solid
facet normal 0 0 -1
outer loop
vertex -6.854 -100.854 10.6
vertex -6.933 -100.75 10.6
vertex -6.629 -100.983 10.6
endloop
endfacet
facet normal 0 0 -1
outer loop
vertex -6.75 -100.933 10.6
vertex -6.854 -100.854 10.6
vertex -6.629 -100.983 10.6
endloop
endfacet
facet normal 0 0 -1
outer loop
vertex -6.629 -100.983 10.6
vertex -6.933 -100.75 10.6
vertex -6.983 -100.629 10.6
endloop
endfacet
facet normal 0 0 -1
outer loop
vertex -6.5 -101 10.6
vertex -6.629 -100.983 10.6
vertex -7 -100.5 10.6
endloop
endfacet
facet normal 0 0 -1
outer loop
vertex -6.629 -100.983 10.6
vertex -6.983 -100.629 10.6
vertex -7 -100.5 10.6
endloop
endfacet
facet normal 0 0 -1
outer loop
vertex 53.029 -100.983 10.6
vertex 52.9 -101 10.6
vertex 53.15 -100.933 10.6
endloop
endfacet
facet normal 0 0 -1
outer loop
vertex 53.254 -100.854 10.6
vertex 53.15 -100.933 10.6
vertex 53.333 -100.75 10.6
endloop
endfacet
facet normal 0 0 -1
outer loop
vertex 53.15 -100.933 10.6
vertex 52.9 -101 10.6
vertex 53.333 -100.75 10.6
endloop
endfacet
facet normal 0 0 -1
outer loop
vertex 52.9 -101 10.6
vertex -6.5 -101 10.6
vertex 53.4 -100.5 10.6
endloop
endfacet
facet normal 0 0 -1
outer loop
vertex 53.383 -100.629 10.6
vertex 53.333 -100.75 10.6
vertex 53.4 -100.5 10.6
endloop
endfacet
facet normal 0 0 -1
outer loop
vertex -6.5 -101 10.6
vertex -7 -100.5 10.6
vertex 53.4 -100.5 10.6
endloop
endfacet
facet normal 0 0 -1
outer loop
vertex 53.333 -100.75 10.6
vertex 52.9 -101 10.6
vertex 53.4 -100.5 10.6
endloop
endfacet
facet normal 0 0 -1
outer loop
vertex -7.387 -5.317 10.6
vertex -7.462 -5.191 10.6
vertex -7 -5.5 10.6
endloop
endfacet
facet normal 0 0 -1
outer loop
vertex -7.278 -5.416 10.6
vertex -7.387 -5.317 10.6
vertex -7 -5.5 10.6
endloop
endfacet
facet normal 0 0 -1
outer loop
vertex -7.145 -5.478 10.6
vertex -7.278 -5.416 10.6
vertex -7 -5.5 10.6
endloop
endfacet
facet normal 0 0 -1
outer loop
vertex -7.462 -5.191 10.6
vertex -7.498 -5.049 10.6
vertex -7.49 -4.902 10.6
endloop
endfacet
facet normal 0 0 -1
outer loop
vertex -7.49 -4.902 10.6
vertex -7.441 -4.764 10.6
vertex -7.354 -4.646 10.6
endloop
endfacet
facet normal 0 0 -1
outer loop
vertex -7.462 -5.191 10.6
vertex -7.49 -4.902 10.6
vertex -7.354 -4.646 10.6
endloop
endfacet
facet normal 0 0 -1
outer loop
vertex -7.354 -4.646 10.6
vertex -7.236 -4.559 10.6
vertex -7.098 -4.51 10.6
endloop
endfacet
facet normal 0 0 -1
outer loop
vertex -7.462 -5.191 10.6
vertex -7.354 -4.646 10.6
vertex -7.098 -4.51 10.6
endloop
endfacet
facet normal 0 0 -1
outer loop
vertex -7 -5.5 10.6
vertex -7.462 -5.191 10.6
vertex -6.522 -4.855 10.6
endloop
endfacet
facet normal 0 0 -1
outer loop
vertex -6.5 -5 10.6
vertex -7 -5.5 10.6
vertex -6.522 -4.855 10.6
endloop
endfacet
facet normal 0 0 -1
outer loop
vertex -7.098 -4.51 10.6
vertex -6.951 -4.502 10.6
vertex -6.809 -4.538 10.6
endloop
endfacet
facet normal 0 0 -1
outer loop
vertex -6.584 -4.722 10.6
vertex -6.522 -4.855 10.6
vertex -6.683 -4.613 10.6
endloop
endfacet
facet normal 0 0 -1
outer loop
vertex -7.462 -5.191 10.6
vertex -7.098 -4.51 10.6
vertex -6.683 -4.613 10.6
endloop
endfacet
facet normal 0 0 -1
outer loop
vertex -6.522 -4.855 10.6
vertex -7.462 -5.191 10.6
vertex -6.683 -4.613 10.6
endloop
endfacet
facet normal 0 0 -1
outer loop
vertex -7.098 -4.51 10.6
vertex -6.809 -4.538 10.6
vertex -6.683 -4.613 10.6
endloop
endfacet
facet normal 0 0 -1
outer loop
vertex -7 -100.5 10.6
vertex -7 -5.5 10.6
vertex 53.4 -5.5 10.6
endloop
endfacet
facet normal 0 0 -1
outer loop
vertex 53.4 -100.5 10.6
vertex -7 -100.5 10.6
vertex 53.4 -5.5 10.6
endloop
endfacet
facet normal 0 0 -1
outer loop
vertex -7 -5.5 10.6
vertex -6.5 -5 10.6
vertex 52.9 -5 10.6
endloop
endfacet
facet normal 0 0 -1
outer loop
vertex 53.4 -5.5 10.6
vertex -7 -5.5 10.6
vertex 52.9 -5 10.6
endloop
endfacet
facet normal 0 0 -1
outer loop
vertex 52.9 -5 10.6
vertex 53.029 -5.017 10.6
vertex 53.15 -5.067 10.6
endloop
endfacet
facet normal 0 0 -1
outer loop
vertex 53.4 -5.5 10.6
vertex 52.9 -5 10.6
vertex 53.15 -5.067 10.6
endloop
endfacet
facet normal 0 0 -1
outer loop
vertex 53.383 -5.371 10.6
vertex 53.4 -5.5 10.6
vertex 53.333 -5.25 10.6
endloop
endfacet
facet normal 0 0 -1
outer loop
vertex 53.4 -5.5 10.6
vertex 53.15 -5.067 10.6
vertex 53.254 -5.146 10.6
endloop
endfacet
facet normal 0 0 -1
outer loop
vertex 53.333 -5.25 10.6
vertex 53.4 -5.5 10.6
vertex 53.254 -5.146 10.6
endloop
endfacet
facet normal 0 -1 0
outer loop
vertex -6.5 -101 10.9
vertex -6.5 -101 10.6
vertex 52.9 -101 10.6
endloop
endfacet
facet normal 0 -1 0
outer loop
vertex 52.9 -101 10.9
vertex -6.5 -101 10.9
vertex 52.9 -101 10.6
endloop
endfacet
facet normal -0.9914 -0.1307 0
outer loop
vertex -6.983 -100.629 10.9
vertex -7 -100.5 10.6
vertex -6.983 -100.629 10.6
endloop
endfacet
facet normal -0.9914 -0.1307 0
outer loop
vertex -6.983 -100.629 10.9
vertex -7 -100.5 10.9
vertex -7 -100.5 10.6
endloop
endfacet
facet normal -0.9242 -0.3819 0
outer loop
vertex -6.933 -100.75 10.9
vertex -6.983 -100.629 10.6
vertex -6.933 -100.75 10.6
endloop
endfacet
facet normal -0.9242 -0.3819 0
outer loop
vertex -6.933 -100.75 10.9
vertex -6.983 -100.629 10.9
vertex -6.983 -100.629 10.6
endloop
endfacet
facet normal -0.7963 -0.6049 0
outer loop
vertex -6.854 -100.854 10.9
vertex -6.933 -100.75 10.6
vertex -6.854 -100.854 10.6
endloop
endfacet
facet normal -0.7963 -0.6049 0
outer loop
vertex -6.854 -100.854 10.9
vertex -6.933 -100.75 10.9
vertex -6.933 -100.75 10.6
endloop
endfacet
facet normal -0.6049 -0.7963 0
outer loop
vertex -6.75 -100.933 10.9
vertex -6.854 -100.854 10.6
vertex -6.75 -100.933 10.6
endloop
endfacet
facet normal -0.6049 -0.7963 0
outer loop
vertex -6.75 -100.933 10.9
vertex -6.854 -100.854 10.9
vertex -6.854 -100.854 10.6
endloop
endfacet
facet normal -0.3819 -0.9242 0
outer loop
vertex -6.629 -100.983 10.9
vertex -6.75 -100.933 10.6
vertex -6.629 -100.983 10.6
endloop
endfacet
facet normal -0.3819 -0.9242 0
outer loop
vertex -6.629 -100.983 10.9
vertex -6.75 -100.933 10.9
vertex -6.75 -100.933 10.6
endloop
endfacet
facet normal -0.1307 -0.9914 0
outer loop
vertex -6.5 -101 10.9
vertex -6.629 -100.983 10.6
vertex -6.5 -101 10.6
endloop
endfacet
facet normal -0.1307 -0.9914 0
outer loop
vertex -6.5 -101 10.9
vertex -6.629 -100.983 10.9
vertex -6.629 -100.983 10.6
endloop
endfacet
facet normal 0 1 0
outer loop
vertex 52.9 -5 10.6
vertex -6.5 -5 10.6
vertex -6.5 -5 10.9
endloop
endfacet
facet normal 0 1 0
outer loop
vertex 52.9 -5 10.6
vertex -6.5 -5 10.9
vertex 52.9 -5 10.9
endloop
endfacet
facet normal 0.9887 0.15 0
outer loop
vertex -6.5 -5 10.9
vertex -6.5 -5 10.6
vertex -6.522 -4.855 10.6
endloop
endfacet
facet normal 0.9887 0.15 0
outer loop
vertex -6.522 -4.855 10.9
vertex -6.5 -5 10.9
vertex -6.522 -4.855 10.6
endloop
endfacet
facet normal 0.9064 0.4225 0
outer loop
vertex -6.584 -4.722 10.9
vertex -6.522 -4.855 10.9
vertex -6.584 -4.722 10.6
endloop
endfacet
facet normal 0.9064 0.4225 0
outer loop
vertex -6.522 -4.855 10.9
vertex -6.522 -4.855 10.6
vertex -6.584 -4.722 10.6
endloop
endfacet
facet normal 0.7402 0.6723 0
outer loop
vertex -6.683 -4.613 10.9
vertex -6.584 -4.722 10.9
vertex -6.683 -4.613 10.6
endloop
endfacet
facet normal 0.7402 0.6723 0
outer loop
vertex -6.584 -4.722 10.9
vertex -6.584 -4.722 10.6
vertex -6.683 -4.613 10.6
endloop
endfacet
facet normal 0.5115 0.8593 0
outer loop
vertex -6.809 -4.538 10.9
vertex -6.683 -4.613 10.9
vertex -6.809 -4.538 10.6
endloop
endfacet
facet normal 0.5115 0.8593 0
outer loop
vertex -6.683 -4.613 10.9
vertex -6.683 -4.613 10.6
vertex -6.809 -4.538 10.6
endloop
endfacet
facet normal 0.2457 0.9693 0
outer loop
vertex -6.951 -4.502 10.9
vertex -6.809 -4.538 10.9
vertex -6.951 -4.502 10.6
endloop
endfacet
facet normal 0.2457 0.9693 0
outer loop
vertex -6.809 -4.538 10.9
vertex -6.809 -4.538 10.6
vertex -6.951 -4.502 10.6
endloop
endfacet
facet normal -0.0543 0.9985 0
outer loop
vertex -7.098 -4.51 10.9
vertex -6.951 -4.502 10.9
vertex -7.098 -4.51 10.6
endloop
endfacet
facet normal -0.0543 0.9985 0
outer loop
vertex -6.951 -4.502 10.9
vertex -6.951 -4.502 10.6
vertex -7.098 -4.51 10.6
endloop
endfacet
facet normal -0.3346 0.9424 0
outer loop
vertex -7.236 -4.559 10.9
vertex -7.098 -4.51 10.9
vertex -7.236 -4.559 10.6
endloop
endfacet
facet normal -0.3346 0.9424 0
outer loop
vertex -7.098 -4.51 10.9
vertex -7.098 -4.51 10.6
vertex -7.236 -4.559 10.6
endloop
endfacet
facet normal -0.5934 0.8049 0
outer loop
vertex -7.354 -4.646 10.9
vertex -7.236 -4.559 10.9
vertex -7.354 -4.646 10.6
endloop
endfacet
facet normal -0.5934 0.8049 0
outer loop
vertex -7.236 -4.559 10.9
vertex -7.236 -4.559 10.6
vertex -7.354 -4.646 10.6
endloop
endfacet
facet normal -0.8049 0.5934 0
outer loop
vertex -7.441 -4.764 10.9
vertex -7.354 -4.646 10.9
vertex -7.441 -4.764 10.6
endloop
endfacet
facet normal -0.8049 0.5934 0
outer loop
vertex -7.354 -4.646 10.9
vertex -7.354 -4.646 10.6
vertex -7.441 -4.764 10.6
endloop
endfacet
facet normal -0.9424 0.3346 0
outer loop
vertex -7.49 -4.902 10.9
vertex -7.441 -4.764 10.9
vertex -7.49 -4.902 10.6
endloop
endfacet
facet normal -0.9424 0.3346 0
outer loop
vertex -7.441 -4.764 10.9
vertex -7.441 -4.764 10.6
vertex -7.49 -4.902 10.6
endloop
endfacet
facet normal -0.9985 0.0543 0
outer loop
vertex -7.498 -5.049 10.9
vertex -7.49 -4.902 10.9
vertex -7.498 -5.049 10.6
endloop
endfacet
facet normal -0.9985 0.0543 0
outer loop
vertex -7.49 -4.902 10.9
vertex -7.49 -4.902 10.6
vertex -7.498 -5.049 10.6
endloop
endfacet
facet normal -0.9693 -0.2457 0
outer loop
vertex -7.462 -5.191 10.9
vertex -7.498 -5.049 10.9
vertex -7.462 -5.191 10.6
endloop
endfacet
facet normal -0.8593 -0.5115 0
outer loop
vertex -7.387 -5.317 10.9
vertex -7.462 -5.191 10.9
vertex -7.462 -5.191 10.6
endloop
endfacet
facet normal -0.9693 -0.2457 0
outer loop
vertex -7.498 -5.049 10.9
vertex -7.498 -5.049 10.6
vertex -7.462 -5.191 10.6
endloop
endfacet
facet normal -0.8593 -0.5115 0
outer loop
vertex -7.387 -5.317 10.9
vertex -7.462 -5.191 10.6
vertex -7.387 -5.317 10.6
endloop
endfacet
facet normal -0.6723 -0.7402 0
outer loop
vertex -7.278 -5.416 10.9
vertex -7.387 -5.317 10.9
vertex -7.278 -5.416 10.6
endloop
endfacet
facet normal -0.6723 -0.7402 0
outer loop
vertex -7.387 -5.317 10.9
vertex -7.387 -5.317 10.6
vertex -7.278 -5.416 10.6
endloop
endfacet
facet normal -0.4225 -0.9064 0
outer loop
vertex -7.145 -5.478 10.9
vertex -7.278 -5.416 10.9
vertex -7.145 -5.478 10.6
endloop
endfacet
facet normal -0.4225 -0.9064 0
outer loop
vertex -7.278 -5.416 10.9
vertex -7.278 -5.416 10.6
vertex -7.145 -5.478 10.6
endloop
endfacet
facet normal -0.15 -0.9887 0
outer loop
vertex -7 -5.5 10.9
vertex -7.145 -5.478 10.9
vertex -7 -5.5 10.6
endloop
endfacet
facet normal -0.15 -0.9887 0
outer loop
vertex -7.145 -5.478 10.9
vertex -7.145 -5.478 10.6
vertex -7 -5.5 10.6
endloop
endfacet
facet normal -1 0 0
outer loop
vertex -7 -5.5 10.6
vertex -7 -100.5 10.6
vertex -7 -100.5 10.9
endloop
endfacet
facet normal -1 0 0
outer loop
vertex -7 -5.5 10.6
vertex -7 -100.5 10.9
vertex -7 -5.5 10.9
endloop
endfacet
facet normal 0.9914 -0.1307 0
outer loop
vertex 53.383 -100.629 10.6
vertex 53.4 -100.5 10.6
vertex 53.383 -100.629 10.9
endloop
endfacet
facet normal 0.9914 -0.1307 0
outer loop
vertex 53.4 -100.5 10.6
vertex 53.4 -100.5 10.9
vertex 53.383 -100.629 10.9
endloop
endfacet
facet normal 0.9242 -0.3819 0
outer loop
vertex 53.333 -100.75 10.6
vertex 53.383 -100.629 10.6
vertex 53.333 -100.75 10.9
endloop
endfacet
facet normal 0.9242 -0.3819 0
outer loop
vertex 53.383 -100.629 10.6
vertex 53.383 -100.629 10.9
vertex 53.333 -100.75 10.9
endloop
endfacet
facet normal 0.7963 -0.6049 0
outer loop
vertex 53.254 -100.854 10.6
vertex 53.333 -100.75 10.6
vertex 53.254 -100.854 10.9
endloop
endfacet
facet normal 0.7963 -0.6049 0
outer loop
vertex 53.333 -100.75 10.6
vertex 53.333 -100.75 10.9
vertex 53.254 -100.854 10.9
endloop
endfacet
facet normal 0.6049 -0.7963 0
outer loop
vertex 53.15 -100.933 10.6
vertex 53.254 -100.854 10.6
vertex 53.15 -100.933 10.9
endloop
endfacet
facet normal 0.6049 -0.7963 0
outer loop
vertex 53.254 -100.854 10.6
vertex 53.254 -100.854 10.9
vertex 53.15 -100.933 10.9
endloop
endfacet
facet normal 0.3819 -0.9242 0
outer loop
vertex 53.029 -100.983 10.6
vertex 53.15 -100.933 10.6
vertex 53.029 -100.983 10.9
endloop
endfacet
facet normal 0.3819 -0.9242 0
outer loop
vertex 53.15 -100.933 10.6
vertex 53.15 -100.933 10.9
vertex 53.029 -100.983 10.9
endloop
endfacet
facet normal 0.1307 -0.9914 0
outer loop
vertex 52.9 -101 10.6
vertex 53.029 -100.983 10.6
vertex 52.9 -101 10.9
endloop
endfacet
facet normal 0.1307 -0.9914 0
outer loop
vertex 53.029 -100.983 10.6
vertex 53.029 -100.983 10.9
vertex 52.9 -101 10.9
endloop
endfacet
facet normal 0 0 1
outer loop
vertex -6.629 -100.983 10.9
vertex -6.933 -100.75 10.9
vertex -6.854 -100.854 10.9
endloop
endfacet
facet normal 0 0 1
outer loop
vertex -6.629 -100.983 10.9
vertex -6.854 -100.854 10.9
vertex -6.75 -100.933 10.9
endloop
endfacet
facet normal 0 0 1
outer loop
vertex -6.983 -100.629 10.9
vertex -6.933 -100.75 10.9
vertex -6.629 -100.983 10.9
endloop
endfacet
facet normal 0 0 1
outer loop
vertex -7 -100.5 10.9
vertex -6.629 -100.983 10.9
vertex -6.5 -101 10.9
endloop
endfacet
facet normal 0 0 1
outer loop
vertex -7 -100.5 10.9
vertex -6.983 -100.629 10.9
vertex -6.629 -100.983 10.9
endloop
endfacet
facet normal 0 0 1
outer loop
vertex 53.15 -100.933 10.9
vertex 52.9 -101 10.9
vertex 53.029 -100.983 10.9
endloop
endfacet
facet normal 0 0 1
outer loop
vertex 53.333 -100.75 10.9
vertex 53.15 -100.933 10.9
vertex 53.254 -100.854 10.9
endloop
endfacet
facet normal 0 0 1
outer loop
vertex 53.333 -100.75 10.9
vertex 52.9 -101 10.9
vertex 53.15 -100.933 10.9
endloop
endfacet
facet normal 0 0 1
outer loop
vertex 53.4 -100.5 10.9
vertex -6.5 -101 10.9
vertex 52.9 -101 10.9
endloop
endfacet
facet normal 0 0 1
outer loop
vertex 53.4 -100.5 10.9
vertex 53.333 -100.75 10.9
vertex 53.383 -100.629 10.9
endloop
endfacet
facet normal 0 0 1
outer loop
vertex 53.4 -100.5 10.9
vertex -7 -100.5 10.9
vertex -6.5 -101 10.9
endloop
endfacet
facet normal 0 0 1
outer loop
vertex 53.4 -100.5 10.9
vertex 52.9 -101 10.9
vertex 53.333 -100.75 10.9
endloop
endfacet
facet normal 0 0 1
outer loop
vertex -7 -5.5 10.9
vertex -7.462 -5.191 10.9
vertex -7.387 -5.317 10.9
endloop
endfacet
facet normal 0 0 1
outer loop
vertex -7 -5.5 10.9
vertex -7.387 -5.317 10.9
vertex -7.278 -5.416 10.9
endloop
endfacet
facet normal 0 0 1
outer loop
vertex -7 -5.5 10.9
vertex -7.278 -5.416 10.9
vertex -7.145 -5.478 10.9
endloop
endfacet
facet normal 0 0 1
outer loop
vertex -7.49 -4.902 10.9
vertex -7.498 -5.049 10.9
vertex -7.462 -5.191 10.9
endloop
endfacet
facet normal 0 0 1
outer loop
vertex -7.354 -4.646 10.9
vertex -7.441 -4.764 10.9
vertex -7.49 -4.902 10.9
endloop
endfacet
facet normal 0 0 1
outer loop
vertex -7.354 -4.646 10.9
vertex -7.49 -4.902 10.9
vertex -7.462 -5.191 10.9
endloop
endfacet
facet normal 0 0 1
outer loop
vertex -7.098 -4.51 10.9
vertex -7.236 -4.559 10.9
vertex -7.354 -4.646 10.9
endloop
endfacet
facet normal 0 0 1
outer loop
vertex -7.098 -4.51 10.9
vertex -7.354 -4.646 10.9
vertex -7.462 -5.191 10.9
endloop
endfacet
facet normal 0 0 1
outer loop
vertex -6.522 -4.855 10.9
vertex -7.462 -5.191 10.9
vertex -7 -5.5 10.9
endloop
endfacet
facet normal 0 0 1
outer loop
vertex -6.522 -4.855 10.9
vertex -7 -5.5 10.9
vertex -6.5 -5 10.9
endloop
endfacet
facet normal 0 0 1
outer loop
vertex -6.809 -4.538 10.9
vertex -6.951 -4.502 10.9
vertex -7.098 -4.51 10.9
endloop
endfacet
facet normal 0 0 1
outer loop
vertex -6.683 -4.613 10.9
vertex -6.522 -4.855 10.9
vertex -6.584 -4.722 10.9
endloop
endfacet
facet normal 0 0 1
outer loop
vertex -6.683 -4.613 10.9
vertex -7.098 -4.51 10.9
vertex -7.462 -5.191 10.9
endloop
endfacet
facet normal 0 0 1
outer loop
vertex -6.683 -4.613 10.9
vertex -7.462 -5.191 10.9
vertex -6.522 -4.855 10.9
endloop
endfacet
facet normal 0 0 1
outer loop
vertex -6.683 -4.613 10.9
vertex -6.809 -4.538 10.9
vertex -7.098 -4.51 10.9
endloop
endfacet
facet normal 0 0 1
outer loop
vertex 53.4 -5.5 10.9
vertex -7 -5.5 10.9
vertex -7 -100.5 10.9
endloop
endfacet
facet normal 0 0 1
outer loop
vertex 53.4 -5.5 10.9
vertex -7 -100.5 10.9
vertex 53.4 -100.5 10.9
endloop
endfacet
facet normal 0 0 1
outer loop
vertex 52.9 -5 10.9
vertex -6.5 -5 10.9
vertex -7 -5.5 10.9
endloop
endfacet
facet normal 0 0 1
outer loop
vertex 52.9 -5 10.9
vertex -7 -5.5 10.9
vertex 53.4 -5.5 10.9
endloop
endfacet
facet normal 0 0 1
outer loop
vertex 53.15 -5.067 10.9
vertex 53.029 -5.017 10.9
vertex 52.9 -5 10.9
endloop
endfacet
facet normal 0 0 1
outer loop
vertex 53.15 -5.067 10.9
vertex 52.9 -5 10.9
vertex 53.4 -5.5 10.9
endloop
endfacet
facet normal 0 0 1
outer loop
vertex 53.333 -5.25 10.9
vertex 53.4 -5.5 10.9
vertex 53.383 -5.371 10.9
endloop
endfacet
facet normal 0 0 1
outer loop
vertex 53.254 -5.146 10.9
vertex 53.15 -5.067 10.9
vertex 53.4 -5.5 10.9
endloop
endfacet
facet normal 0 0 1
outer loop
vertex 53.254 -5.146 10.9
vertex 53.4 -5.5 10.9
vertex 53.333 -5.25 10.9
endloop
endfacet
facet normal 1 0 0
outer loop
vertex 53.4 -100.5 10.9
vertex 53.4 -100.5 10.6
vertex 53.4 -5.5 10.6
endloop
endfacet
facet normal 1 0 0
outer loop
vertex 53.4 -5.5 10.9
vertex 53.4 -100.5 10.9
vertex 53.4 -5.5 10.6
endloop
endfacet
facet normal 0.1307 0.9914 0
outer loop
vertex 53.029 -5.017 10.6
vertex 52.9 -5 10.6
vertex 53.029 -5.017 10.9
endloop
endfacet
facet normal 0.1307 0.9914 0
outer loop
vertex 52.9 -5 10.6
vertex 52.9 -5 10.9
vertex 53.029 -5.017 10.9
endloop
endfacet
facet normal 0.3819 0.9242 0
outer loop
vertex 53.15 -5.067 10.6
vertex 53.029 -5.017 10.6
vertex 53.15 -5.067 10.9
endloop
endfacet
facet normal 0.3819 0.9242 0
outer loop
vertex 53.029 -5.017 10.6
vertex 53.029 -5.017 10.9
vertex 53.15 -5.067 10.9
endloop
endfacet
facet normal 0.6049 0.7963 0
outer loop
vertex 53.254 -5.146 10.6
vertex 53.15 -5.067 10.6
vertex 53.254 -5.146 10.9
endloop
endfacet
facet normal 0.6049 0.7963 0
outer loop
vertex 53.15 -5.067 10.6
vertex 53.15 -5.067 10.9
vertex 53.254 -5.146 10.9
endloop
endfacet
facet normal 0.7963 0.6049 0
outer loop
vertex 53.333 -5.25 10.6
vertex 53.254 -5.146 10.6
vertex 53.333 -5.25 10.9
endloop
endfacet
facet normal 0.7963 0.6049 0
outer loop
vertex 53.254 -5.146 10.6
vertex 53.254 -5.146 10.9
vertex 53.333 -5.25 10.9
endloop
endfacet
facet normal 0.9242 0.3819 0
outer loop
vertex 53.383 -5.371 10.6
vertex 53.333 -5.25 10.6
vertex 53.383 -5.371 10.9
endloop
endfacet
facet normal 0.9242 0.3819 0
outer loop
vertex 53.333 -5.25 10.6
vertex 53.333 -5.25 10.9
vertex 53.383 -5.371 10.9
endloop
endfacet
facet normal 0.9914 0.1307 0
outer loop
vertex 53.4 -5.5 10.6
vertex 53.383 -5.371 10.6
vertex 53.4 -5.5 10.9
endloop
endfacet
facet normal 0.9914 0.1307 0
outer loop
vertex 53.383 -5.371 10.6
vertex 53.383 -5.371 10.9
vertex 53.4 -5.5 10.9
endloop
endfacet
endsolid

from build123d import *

# Parameters (mm, degrees)
CYLINDER_R     = 0.5
CYLINDER_DEPTH = 0.3
BOX003_W       = 60.4
BOX003_H       = 96
BOX003_DEPTH   = 0.3
FILLET001_R    = 0.5
FILLET002_R    = 0.5
FILLET003_R    = 0.5
FILLET004_R    = 0.5


with BuildPart() as cylinder:
    # Cylinder → Cylinder (new body)
    with BuildSketch(Plane(origin=(-7, -5, 10.6), x_dir=(1, 0, 0), z_dir=(0, 0, 1))):
        Circle(CYLINDER_R)
    extrude(amount=CYLINDER_DEPTH)


with BuildPart() as fusion:
    # Box003 → Box003 (new body)
    with BuildSketch(Plane(origin=(-7, -101, 10.6), x_dir=(1, 0, 0), z_dir=(0, 0, 1))):
        with Locations((30.2, 48)):
            Rectangle(BOX003_W, BOX003_H)
    extrude(amount=BOX003_DEPTH)

    # Fillet001
    fillet001_edges = [fusion.edges().sort_by_distance(p)[0] for p in [
        (-7, -101, 10.75),
    ]]
    fillet(fillet001_edges, radius=FILLET001_R)

    # Fillet002
    fillet002_edges = [fusion.edges().sort_by_distance(p)[0] for p in [
        (53.4, -5, 10.75),
    ]]
    fillet(fillet002_edges, radius=FILLET002_R)

    # Fillet003
    fillet003_edges = [fusion.edges().sort_by_distance(p)[0] for p in [
        (53.4, -101, 10.75),
    ]]
    fillet(fillet003_edges, radius=FILLET003_R)

    # Fillet004
    fillet004_edges = [fusion.edges().sort_by_distance(p)[0] for p in [
        (-7, -5, 10.75),
    ]]
    fillet(fillet004_edges, radius=FILLET004_R)

    # Fusion: union Cylinder
    add(cylinder.part)


solid = fusion.part
